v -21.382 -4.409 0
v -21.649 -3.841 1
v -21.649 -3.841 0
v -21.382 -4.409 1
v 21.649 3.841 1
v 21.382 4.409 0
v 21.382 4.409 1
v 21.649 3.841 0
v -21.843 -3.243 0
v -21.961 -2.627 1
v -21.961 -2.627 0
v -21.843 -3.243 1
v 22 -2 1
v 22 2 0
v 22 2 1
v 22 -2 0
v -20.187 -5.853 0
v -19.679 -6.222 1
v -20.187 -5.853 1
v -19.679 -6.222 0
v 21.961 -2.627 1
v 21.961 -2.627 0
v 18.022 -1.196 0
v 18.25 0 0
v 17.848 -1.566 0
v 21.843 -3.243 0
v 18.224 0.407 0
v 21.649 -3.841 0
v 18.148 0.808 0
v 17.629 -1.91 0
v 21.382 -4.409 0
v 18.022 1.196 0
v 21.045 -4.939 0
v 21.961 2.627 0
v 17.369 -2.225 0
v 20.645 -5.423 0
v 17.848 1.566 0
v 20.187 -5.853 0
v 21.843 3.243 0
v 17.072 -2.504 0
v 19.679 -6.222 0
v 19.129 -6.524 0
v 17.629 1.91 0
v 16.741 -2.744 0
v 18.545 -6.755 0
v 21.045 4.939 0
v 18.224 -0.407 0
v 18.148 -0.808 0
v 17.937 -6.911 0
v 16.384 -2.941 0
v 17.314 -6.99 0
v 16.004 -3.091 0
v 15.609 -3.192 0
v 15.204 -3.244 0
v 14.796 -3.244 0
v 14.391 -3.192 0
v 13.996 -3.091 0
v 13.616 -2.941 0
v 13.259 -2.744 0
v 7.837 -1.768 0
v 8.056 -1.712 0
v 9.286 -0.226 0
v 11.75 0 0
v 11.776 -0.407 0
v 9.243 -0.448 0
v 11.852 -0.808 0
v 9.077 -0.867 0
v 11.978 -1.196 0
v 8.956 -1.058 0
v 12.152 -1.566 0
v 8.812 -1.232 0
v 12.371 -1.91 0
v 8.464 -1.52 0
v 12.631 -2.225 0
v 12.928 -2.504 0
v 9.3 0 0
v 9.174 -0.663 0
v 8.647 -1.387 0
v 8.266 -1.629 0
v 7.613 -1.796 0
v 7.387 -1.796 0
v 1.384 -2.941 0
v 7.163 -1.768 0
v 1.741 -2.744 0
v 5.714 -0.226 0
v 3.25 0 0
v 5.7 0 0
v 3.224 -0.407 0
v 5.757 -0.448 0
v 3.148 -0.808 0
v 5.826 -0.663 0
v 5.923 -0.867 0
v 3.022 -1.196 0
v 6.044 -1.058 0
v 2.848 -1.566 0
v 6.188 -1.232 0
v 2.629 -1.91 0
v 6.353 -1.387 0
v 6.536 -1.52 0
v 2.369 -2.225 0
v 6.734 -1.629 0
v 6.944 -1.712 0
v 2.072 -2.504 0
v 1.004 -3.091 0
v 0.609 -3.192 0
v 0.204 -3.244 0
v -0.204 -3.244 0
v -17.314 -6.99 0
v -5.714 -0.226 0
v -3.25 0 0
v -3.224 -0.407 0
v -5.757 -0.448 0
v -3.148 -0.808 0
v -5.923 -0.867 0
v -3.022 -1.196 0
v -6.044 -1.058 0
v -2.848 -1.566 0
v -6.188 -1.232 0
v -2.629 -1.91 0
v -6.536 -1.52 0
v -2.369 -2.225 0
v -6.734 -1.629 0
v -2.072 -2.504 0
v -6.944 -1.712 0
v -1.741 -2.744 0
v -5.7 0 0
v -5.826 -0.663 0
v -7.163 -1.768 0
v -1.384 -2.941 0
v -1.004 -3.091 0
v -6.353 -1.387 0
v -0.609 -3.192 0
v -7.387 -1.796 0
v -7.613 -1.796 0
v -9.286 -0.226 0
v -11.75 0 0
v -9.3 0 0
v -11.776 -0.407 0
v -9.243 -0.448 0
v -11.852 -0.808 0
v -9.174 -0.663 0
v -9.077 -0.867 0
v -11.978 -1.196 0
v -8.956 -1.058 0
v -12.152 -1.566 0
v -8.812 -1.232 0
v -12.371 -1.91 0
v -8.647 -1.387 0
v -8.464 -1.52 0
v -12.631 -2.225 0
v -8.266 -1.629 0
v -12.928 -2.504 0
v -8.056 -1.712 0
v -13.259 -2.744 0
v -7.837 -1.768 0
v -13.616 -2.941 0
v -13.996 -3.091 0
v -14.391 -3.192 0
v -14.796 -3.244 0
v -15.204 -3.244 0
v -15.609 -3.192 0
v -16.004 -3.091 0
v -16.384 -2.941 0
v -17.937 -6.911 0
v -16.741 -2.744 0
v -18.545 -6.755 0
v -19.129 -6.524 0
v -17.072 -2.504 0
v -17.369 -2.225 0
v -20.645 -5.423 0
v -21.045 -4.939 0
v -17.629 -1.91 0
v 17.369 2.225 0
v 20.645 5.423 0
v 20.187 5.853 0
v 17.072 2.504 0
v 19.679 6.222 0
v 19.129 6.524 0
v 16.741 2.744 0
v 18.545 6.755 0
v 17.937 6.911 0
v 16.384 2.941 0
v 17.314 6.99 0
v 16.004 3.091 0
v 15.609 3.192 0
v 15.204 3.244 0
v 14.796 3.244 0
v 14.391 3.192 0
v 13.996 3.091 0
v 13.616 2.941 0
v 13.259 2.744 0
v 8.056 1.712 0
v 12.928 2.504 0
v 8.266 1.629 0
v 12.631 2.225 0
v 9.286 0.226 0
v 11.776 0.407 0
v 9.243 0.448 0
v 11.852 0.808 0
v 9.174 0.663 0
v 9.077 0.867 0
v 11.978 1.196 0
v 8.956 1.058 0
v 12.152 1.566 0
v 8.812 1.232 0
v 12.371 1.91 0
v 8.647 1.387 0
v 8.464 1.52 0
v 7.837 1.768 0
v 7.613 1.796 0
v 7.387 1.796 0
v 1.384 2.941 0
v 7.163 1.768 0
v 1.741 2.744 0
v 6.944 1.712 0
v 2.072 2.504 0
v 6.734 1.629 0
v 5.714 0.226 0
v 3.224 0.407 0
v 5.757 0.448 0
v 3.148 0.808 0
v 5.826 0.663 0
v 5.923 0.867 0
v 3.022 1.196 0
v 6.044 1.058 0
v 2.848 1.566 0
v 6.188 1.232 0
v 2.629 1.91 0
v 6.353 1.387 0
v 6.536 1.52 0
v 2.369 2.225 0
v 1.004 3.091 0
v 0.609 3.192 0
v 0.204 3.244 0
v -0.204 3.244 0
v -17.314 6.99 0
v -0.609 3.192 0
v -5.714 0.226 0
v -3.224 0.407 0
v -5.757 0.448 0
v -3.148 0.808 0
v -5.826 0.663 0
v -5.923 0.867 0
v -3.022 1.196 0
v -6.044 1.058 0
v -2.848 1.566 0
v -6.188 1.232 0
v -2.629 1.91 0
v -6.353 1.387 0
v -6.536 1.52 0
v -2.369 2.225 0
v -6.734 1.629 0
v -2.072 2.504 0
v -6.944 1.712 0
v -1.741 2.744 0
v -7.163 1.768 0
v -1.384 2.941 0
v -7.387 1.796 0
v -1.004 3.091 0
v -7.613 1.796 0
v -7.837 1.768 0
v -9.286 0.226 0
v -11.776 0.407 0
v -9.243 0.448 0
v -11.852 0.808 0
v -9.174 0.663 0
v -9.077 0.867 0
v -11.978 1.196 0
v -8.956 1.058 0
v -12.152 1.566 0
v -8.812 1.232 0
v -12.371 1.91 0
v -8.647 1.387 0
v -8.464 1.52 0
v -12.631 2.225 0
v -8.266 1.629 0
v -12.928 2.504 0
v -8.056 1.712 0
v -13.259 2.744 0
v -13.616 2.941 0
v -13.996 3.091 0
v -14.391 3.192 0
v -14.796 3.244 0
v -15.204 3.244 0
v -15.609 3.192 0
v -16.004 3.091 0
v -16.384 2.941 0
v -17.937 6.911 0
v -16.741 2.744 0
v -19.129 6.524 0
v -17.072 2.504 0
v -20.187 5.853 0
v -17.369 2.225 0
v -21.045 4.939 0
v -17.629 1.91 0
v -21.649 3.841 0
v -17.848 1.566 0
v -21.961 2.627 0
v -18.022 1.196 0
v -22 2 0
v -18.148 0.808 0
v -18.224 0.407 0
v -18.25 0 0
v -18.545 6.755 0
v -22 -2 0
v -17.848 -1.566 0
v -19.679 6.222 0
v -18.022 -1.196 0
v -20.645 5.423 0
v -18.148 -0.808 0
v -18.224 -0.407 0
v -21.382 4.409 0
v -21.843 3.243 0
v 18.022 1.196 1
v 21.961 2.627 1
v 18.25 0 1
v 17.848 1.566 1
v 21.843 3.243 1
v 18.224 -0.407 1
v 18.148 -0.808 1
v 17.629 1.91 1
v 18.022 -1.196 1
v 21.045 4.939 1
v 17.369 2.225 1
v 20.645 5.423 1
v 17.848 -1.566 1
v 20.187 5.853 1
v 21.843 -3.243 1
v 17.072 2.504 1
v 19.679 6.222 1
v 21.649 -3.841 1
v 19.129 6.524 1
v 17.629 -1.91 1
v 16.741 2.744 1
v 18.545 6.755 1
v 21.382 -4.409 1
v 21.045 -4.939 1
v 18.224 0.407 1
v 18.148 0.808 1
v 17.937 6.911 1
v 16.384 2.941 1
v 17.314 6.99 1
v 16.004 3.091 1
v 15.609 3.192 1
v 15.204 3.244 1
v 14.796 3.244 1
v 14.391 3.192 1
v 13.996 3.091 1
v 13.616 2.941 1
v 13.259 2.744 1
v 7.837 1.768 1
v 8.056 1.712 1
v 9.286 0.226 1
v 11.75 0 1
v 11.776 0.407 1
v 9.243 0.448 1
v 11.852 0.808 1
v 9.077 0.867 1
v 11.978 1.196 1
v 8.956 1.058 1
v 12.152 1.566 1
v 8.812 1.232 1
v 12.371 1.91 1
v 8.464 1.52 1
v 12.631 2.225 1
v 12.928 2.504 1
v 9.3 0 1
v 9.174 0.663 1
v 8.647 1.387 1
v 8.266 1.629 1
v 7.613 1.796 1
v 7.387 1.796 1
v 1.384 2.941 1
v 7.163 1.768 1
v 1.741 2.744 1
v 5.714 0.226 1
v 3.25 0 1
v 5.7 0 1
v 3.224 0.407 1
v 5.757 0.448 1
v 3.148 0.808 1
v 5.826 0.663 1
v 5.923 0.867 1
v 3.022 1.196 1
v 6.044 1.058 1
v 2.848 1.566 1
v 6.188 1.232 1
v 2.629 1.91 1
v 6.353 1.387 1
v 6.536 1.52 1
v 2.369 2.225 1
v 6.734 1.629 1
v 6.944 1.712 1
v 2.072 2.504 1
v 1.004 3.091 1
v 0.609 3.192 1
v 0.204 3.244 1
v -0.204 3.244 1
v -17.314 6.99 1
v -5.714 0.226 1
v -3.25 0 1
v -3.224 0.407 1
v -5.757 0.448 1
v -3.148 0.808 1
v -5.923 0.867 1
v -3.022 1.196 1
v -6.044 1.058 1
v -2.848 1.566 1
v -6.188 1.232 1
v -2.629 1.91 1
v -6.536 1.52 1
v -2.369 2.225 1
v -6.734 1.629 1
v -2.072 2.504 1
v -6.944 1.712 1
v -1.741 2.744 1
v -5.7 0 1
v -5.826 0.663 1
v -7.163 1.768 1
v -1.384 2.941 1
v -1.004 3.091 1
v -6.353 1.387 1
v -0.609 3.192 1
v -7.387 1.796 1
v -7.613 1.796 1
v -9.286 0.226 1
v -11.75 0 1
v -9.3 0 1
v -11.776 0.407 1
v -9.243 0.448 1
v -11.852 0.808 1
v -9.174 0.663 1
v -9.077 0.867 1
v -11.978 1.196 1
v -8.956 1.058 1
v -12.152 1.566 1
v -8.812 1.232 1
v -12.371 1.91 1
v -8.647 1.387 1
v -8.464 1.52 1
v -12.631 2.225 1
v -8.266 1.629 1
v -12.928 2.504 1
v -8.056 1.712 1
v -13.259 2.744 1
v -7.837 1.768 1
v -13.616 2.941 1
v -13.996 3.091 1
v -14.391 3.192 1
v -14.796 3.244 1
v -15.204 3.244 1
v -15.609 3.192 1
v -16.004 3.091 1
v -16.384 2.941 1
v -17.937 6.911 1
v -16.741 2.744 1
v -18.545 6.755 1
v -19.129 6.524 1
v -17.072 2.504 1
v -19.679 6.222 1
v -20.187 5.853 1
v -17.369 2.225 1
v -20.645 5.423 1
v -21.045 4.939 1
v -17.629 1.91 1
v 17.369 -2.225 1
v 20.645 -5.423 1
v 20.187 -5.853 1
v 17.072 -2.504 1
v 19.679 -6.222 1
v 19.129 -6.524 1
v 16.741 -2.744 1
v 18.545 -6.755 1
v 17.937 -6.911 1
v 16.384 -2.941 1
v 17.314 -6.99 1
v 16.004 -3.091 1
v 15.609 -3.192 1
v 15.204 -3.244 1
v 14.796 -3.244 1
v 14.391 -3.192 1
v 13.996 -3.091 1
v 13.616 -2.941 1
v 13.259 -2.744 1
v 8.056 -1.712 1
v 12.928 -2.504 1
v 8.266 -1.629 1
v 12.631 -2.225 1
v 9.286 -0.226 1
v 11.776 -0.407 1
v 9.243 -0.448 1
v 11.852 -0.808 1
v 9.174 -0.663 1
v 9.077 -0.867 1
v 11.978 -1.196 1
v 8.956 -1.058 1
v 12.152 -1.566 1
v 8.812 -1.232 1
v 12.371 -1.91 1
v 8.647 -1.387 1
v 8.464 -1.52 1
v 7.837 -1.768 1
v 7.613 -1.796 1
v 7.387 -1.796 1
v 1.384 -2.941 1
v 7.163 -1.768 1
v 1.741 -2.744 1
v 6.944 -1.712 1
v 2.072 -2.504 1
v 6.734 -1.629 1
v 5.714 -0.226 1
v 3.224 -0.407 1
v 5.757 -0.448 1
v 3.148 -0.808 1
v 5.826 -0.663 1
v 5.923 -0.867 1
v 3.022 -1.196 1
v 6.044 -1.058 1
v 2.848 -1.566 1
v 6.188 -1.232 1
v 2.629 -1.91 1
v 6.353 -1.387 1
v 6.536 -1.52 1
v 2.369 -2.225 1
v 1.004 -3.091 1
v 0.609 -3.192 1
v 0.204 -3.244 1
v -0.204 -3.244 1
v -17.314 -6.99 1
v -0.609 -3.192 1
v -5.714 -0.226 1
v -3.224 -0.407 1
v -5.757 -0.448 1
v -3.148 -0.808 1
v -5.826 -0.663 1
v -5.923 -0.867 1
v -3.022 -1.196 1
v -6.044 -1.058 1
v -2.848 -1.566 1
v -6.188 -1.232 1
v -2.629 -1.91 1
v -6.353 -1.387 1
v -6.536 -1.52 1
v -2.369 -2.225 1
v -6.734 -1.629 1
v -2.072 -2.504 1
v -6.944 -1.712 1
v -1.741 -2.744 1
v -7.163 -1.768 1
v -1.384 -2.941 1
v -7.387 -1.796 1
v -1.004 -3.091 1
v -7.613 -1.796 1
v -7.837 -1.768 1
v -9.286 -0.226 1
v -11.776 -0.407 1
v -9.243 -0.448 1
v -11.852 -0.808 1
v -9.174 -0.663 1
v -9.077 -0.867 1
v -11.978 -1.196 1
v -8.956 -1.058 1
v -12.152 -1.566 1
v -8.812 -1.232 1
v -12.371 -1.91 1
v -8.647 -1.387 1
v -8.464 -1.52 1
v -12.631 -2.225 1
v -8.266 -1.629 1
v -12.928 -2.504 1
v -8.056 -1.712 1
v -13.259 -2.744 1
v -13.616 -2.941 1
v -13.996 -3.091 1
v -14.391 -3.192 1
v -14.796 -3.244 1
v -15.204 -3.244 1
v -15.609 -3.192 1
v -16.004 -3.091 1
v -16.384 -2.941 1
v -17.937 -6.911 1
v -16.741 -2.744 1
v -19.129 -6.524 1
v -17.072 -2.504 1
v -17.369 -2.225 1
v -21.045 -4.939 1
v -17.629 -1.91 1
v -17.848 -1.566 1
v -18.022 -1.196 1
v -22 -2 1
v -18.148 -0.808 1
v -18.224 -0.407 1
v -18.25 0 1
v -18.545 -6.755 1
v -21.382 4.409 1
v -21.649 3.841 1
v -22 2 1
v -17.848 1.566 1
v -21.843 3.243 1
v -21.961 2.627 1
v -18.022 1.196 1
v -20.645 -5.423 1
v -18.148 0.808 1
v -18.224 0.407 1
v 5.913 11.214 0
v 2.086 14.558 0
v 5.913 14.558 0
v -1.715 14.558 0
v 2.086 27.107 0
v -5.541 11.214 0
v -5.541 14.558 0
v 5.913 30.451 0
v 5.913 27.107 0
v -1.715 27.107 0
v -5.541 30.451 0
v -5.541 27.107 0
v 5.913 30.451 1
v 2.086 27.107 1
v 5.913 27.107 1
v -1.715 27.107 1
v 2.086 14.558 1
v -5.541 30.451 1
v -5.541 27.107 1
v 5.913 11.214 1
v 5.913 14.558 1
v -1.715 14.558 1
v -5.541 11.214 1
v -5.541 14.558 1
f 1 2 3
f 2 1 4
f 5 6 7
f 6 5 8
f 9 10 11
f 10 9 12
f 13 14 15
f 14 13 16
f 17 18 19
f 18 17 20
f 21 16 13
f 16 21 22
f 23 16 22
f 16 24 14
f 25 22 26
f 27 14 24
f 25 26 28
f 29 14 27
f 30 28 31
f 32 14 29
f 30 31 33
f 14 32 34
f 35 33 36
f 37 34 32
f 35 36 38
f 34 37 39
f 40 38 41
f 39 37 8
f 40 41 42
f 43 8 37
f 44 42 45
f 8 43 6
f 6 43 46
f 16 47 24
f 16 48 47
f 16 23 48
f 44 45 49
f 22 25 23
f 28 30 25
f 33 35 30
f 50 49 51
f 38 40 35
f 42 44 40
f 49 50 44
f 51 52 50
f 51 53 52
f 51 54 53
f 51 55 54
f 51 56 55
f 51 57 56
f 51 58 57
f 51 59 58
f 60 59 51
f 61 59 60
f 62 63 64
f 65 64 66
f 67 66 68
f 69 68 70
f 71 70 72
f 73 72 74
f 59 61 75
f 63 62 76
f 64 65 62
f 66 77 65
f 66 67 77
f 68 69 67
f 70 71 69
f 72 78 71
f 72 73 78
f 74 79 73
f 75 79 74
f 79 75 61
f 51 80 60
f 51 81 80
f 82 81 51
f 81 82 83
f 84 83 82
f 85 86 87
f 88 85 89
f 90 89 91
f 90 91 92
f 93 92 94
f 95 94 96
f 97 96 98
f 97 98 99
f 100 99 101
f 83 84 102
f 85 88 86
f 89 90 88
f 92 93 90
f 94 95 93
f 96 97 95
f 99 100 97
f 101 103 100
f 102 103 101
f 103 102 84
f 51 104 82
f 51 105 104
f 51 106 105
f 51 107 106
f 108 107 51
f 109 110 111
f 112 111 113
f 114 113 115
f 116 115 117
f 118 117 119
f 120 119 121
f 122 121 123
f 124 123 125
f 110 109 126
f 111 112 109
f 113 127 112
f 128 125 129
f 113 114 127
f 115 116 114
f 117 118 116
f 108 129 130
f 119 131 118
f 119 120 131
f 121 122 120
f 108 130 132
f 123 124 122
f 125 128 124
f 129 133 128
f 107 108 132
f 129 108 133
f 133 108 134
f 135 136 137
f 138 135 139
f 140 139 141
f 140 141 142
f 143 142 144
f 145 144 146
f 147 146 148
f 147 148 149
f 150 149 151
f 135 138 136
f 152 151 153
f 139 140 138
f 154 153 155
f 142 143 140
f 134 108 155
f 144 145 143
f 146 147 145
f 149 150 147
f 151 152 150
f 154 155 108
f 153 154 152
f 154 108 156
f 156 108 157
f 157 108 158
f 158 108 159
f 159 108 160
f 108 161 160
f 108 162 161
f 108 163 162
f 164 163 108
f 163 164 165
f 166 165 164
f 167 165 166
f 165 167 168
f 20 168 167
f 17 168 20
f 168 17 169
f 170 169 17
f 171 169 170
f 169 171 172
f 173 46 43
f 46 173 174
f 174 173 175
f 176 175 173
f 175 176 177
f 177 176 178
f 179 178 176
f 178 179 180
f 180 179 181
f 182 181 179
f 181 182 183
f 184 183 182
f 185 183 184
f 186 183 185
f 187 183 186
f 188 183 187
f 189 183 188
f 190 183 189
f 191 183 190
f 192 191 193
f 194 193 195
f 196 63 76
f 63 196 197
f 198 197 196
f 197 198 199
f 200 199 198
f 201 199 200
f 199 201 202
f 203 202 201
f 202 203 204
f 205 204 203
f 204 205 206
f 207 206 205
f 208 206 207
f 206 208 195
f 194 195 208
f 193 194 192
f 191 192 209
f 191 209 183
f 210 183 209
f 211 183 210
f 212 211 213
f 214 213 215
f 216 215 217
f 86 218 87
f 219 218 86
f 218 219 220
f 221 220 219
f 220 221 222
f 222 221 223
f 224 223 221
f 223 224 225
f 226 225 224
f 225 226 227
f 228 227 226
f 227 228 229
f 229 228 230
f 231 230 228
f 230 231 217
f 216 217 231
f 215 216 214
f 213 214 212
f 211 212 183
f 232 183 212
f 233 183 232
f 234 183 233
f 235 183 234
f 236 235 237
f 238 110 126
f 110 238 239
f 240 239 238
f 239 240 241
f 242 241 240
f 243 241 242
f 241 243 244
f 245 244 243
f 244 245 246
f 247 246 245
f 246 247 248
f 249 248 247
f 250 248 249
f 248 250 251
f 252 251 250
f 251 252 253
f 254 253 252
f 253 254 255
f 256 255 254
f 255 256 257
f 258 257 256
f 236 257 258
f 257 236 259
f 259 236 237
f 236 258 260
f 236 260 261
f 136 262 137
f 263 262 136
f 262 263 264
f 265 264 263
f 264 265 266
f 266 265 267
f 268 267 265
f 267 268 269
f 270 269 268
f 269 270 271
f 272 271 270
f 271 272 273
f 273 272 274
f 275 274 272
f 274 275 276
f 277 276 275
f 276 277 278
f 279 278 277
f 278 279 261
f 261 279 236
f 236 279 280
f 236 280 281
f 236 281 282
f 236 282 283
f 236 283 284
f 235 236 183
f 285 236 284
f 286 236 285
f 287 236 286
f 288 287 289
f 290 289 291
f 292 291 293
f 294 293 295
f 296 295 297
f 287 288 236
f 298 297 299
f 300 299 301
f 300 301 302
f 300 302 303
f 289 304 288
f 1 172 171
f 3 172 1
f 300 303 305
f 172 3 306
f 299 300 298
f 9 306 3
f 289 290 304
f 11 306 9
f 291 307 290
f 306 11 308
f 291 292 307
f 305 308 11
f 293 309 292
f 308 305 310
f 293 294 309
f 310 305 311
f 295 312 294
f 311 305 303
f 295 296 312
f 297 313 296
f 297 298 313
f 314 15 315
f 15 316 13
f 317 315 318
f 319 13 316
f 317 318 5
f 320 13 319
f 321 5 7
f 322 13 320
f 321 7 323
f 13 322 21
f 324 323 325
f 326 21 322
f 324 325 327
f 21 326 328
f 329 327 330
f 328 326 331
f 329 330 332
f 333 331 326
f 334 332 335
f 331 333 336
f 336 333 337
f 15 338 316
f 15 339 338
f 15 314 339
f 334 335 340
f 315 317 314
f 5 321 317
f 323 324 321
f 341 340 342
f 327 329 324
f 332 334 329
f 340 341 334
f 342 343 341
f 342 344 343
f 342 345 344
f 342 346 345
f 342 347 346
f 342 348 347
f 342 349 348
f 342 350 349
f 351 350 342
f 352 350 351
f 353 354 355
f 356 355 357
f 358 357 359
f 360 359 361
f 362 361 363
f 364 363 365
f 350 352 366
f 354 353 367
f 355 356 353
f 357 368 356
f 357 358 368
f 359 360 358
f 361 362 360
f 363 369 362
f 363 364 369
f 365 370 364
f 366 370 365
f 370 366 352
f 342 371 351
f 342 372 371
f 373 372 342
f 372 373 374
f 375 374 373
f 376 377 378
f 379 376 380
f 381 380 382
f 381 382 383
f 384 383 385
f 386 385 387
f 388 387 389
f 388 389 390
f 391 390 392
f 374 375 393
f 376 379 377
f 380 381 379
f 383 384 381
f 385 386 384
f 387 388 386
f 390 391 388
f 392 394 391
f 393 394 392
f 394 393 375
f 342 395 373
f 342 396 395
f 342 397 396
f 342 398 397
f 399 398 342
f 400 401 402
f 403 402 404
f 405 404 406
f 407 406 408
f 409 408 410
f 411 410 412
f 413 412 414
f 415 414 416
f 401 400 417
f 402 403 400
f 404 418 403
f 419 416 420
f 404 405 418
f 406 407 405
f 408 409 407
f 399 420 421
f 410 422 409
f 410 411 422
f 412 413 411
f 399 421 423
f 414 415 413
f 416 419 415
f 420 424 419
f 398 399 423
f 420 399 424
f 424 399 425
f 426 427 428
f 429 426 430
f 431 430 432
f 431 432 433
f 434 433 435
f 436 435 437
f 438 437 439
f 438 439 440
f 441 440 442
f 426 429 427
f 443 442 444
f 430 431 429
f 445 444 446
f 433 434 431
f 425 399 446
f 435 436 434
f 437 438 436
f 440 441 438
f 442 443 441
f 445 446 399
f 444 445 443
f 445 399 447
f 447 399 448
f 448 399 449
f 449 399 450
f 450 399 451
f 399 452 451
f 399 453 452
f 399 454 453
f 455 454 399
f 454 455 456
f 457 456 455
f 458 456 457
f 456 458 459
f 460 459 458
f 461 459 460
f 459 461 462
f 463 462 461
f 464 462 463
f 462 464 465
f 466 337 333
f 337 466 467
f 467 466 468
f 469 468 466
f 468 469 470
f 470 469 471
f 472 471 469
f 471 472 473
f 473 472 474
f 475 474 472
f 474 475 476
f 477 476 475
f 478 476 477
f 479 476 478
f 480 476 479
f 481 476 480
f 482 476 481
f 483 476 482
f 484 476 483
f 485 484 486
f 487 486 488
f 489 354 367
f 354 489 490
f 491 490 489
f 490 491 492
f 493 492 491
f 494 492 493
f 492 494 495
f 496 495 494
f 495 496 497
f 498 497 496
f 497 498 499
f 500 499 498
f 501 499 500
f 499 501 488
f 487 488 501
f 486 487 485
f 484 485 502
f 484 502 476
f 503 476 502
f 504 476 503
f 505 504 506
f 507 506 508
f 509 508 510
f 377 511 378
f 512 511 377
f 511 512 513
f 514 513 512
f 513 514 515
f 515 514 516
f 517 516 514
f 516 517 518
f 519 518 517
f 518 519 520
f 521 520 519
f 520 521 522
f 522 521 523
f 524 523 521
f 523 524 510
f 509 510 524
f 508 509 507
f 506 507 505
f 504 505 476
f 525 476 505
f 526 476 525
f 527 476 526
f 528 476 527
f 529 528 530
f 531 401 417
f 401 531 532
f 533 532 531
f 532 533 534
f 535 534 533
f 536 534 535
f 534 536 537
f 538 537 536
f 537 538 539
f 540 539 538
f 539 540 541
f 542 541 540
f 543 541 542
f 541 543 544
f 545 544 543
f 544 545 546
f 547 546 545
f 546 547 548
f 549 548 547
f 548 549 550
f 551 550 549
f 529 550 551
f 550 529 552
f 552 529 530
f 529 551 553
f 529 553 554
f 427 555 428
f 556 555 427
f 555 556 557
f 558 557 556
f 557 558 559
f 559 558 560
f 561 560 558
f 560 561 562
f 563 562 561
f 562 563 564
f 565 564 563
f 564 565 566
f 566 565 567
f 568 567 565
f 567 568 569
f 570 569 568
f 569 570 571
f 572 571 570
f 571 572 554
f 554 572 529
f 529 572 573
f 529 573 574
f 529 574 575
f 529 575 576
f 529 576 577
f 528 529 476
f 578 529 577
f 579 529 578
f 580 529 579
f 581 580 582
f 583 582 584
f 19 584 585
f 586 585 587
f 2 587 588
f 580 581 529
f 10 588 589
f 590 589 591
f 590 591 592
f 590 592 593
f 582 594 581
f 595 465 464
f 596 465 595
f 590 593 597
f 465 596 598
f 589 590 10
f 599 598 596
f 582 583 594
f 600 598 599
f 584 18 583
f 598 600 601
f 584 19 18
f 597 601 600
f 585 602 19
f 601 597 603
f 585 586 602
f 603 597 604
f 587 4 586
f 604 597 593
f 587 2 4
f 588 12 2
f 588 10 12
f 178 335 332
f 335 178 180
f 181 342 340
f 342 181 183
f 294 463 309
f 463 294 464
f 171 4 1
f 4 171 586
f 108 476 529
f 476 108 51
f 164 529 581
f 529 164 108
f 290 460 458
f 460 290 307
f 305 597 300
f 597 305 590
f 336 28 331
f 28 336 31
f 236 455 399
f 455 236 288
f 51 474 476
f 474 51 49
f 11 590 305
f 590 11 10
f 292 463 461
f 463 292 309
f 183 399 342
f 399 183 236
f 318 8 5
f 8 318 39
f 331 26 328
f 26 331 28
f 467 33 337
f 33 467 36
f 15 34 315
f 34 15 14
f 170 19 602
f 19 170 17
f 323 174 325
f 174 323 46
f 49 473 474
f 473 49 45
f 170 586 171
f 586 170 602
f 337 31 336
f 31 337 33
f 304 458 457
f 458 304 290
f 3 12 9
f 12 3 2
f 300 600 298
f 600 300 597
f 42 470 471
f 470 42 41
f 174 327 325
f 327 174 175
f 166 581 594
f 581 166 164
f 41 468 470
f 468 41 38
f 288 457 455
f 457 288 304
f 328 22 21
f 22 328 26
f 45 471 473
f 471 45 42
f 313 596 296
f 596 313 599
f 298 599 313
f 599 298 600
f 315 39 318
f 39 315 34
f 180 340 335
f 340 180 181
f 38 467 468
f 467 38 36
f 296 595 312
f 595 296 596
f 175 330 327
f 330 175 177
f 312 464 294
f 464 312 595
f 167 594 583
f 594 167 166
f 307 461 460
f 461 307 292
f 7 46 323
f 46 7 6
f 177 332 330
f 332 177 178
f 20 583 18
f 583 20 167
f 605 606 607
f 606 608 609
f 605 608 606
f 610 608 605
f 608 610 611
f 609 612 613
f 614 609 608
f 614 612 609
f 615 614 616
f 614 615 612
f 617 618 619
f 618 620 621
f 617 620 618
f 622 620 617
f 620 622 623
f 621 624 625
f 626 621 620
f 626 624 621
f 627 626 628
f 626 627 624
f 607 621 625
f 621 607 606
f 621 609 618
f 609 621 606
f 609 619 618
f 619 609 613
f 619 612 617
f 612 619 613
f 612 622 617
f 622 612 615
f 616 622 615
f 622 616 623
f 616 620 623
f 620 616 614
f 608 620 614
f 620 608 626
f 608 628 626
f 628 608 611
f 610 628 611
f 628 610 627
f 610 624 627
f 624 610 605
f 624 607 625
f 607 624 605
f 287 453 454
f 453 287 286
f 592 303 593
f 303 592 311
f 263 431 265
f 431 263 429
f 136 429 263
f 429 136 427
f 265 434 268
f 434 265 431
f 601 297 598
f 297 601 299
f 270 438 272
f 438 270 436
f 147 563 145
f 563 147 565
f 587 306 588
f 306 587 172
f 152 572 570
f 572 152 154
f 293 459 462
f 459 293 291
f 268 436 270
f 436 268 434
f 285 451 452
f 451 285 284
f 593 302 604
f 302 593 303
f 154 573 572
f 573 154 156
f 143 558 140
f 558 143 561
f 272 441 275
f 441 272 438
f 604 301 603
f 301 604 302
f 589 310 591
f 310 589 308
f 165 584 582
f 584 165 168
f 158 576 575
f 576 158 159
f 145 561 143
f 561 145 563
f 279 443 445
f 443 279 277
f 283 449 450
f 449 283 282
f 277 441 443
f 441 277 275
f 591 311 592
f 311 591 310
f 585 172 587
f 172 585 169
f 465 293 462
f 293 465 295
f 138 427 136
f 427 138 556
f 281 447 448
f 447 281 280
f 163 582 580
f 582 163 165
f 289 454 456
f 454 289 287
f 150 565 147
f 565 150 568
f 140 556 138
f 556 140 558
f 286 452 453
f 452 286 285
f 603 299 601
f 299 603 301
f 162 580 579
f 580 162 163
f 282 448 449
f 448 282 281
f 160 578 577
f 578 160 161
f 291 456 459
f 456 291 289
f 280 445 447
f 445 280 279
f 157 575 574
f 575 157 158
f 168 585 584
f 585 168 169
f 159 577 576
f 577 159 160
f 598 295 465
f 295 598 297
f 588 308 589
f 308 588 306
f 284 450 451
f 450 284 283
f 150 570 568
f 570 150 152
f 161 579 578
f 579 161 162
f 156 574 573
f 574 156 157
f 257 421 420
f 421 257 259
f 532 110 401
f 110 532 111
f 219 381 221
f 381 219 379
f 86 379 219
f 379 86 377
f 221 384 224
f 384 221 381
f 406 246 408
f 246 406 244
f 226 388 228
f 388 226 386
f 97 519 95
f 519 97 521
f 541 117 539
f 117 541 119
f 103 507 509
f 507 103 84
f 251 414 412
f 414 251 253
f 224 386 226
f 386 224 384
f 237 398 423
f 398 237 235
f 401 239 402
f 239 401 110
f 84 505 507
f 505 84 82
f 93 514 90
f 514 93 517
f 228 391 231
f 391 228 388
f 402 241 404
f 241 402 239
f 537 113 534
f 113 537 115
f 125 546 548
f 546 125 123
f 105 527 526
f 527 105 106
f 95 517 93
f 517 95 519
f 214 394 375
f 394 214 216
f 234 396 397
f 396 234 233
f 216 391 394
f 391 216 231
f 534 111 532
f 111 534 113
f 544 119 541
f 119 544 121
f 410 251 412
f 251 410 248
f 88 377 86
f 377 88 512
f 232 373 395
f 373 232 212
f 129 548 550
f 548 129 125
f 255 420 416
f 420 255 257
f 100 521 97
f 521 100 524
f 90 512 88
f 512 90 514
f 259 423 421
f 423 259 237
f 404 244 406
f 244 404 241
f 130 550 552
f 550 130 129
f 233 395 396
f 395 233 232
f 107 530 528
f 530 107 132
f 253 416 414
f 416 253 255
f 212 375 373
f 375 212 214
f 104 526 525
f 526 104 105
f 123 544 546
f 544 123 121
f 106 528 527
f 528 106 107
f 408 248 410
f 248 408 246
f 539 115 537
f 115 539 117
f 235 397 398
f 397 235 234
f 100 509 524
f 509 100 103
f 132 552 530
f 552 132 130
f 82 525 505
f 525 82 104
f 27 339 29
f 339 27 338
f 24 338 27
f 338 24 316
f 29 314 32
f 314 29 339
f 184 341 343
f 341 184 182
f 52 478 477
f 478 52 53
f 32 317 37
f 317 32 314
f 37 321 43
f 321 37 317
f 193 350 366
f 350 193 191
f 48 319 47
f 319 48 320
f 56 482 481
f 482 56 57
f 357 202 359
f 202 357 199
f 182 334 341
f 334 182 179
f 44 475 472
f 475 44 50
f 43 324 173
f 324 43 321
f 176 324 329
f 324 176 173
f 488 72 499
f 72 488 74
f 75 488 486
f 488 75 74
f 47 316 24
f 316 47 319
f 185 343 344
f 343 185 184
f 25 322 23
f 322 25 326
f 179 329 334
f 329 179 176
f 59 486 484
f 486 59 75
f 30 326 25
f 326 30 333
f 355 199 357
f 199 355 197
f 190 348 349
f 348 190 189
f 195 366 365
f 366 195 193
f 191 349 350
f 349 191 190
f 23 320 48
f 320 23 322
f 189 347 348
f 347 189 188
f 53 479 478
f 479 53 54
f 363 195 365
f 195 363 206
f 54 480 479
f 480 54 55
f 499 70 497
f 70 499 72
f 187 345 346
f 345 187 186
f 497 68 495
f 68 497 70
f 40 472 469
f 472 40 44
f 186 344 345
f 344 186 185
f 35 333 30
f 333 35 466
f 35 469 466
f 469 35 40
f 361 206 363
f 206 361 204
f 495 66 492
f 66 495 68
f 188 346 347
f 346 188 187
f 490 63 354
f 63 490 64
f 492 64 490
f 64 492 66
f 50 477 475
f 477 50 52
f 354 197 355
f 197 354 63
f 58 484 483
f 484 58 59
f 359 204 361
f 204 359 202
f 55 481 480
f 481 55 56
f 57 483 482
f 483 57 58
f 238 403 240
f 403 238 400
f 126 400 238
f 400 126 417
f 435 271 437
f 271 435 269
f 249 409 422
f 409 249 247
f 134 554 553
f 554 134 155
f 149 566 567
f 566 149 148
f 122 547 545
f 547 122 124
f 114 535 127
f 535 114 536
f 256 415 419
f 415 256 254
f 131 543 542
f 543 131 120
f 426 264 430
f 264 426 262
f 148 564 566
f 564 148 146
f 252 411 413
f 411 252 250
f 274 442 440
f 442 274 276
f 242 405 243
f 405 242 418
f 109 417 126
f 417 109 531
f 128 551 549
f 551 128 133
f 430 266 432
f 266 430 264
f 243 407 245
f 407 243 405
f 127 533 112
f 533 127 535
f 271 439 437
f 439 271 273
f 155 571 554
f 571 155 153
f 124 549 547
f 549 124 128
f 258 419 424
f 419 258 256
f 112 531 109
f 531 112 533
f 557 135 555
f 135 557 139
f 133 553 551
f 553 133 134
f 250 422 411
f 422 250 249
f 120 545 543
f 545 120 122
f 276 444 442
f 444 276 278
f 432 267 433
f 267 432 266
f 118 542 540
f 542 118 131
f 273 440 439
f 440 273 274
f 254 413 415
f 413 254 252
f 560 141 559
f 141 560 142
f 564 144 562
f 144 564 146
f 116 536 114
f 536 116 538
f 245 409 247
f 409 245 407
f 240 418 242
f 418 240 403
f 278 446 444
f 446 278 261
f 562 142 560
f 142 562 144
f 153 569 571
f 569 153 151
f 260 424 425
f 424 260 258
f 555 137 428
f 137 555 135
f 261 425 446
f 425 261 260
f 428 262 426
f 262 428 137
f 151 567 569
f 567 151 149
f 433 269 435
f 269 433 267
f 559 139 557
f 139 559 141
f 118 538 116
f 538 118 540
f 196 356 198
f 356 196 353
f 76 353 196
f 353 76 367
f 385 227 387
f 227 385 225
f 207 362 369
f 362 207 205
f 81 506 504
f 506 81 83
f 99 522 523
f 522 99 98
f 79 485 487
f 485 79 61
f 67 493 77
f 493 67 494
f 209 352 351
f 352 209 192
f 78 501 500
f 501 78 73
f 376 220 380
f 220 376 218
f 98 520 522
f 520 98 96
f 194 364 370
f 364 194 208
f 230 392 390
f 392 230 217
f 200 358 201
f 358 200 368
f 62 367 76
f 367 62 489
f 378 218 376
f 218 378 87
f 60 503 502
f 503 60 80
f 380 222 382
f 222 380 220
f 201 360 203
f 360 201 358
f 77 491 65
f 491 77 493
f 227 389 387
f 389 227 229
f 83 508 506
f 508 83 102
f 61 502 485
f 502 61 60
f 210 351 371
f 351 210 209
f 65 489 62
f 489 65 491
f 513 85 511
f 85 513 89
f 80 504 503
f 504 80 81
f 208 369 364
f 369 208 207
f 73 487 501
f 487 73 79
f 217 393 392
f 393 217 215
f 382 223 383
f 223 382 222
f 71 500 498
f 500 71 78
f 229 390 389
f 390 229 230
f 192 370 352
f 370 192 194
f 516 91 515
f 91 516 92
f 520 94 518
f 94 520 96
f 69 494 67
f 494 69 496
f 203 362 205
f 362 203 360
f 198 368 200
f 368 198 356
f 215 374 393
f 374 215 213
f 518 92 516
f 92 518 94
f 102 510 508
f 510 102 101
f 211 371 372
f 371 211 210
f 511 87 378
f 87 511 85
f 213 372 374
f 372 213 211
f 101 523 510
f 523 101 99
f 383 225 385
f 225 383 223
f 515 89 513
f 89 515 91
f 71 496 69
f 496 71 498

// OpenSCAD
$fn = 50;


difference() {
	union() {
		hull() {
			translate(v = [-17.0000000000, 2.0000000000, 0]) {
				cylinder(h = 1, r = 5);
			}
			translate(v = [17.0000000000, 2.0000000000, 0]) {
				cylinder(h = 1, r = 5);
			}
			translate(v = [-17.0000000000, -2.0000000000, 0]) {
				cylinder(h = 1, r = 5);
			}
			translate(v = [17.0000000000, -2.0000000000, 0]) {
				cylinder(h = 1, r = 5);
			}
		}
		translate(v = [0, 30.0000000000, 0]) {
			linear_extrude(height = 1) {
				text(font = "DejaVu Sans Mono:style=Bold", halign = "center", size = 19.0000000000, text = "I", valign = "top");
			}
		}
	}
	union() {
		translate(v = [-15.0000000000, 0.0000000000, 0]) {
			translate(v = [0, 0, -100]) {
				cylinder(h = 200, r = 3.2500000000);
			}
		}
		translate(v = [0, 0, -100]) {
			cylinder(h = 200, r = 3.2500000000);
		}
		translate(v = [15.0000000000, 0.0000000000, 0]) {
			translate(v = [0, 0, -100]) {
				cylinder(h = 200, r = 3.2500000000);
			}
		}
		translate(v = [-15.0000000000, 0.0000000000, 0]) {
			translate(v = [0, 0, -100]) {
				cylinder(h = 200, r = 1.8000000000);
			}
		}
		translate(v = [-7.5000000000, 0.0000000000, 0]) {
			translate(v = [0, 0, -100]) {
				cylinder(h = 200, r = 1.8000000000);
			}
		}
		translate(v = [0, 0, -100]) {
			cylinder(h = 200, r = 1.8000000000);
		}
		translate(v = [7.5000000000, 0.0000000000, 0]) {
			translate(v = [0, 0, -100]) {
				cylinder(h = 200, r = 1.8000000000);
			}
		}
		translate(v = [15.0000000000, 0.0000000000, 0]) {
			translate(v = [0, 0, -100]) {
				cylinder(h = 200, r = 1.8000000000);
			}
		}
	}
}
